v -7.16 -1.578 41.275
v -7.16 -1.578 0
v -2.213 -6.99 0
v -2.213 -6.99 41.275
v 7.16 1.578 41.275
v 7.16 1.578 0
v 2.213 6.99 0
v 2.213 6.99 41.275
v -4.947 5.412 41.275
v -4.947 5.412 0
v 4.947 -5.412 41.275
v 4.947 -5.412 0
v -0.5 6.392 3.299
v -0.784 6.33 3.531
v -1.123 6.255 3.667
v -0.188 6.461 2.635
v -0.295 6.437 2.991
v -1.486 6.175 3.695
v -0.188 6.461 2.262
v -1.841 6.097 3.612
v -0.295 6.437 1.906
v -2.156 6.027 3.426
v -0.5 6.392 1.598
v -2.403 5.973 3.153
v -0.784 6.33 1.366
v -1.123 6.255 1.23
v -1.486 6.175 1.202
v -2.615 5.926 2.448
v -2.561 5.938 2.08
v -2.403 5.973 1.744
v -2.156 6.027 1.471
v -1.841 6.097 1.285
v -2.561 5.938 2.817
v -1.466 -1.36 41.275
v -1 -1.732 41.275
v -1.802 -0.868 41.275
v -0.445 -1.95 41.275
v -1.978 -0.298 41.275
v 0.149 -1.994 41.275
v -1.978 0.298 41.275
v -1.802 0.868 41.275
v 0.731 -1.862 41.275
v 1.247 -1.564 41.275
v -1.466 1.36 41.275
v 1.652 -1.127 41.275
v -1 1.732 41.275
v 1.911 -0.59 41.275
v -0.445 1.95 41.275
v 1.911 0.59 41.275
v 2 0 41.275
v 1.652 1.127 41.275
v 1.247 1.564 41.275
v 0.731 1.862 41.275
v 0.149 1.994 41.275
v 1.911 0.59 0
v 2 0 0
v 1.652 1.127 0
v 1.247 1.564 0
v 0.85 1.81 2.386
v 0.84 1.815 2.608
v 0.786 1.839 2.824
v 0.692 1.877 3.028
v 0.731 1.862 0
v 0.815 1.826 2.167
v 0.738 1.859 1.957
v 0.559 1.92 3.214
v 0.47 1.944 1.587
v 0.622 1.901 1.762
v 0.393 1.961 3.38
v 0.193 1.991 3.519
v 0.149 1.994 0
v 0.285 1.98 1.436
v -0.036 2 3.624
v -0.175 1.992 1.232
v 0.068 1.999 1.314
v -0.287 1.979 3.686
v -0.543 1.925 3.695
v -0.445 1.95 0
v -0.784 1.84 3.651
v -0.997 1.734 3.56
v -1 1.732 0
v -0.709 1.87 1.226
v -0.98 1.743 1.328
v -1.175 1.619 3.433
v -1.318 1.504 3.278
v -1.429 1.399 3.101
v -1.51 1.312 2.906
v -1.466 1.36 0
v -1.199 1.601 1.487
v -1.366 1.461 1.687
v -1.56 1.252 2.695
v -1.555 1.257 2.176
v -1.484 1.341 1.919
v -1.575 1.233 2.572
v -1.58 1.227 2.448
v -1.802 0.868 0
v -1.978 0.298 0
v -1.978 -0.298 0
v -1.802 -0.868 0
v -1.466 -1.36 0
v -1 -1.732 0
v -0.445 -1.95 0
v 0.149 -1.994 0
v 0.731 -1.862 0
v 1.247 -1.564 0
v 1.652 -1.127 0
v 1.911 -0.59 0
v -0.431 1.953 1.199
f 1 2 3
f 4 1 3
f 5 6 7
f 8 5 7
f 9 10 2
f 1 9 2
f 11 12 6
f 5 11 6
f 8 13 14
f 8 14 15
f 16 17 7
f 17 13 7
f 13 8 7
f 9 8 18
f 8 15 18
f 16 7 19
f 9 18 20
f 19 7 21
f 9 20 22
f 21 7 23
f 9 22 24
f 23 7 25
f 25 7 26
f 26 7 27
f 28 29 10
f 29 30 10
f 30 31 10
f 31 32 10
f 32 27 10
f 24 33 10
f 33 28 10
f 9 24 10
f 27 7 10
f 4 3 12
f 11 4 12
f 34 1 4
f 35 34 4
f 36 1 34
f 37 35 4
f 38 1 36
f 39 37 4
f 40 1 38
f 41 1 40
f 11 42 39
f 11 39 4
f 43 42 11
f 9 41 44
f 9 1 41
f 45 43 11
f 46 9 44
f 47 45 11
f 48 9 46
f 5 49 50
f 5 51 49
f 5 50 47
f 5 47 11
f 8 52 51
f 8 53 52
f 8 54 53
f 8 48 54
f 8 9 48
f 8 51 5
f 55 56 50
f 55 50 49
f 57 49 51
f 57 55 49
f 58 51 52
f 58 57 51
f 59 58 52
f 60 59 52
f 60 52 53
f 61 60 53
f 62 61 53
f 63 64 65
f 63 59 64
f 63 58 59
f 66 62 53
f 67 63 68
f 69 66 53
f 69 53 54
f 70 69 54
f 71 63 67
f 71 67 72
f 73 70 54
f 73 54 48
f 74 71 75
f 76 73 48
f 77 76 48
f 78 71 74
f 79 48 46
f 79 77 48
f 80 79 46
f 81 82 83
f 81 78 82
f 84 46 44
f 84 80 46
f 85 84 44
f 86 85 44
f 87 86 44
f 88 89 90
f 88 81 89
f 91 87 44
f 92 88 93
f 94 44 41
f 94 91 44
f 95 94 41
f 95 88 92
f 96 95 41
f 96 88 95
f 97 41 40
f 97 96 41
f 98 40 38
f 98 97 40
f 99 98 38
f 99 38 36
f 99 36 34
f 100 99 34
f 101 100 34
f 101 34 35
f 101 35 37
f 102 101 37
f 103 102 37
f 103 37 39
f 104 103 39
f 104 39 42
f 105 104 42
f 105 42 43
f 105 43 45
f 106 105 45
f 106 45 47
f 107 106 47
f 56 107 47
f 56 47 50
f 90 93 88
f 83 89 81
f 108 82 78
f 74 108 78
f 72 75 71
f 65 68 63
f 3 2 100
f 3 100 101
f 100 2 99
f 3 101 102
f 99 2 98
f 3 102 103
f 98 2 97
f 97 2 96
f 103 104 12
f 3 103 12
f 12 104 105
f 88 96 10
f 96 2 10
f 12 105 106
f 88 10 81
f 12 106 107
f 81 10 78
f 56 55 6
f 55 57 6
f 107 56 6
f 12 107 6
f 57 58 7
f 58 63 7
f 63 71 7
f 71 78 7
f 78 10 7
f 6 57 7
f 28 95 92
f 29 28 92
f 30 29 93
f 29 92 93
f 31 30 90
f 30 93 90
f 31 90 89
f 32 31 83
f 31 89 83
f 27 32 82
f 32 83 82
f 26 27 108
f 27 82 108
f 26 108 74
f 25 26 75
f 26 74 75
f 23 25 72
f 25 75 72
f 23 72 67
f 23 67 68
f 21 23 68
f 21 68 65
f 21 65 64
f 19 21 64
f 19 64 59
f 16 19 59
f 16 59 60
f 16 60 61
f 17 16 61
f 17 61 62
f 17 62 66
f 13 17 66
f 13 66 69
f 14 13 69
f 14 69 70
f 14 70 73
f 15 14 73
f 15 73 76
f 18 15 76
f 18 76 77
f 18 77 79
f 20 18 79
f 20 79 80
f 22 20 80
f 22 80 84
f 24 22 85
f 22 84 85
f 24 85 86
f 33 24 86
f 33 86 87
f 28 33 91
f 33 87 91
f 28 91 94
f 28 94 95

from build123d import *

# Parameters (mm, degrees)
SKETCH1_R             = 2.00000108
BOSS_EXTRUDE1_DEPTH   = 41.275
M3_TAPPED_HOLE1_D     = 2.5
M3_TAPPED_HOLE1_DEPTH = 6.35
M3_TAPPED_HOLE1_TIP   = 0.751075774


with BuildPart() as part:
    # Sketch1 → Boss-Extrude1 (new body)
    with BuildSketch(Plane.XY):
        Polygon((2.213234223, 6.990345314), (-4.947199511, 5.411889719), (-7.160433735, -1.578455595), (-2.213234223, -6.990345314), (4.947199511, -5.411889719), (7.160433735, 1.578455595), align=None)
        Circle(SKETCH1_R, mode=Mode.SUBTRACT)
    extrude(amount=BOSS_EXTRUDE1_DEPTH)

    # M3 Tapped Hole1
    with Locations(Plane(origin=(-1.394683733, 6.195011051, 2.448450975), x_dir=(0.976553939578, 0.21527285731, 0), z_dir=(-0.21527285731, 0.976553939578, 0))):
        with Locations((0, 0)):
            Hole(M3_TAPPED_HOLE1_D / 2, depth=M3_TAPPED_HOLE1_DEPTH)
            with Locations((0, 0, -(M3_TAPPED_HOLE1_DEPTH + M3_TAPPED_HOLE1_TIP / 2))):  # 118° drill point
                Cone(0, M3_TAPPED_HOLE1_D / 2, M3_TAPPED_HOLE1_TIP, mode=Mode.SUBTRACT)


solid = part.part
